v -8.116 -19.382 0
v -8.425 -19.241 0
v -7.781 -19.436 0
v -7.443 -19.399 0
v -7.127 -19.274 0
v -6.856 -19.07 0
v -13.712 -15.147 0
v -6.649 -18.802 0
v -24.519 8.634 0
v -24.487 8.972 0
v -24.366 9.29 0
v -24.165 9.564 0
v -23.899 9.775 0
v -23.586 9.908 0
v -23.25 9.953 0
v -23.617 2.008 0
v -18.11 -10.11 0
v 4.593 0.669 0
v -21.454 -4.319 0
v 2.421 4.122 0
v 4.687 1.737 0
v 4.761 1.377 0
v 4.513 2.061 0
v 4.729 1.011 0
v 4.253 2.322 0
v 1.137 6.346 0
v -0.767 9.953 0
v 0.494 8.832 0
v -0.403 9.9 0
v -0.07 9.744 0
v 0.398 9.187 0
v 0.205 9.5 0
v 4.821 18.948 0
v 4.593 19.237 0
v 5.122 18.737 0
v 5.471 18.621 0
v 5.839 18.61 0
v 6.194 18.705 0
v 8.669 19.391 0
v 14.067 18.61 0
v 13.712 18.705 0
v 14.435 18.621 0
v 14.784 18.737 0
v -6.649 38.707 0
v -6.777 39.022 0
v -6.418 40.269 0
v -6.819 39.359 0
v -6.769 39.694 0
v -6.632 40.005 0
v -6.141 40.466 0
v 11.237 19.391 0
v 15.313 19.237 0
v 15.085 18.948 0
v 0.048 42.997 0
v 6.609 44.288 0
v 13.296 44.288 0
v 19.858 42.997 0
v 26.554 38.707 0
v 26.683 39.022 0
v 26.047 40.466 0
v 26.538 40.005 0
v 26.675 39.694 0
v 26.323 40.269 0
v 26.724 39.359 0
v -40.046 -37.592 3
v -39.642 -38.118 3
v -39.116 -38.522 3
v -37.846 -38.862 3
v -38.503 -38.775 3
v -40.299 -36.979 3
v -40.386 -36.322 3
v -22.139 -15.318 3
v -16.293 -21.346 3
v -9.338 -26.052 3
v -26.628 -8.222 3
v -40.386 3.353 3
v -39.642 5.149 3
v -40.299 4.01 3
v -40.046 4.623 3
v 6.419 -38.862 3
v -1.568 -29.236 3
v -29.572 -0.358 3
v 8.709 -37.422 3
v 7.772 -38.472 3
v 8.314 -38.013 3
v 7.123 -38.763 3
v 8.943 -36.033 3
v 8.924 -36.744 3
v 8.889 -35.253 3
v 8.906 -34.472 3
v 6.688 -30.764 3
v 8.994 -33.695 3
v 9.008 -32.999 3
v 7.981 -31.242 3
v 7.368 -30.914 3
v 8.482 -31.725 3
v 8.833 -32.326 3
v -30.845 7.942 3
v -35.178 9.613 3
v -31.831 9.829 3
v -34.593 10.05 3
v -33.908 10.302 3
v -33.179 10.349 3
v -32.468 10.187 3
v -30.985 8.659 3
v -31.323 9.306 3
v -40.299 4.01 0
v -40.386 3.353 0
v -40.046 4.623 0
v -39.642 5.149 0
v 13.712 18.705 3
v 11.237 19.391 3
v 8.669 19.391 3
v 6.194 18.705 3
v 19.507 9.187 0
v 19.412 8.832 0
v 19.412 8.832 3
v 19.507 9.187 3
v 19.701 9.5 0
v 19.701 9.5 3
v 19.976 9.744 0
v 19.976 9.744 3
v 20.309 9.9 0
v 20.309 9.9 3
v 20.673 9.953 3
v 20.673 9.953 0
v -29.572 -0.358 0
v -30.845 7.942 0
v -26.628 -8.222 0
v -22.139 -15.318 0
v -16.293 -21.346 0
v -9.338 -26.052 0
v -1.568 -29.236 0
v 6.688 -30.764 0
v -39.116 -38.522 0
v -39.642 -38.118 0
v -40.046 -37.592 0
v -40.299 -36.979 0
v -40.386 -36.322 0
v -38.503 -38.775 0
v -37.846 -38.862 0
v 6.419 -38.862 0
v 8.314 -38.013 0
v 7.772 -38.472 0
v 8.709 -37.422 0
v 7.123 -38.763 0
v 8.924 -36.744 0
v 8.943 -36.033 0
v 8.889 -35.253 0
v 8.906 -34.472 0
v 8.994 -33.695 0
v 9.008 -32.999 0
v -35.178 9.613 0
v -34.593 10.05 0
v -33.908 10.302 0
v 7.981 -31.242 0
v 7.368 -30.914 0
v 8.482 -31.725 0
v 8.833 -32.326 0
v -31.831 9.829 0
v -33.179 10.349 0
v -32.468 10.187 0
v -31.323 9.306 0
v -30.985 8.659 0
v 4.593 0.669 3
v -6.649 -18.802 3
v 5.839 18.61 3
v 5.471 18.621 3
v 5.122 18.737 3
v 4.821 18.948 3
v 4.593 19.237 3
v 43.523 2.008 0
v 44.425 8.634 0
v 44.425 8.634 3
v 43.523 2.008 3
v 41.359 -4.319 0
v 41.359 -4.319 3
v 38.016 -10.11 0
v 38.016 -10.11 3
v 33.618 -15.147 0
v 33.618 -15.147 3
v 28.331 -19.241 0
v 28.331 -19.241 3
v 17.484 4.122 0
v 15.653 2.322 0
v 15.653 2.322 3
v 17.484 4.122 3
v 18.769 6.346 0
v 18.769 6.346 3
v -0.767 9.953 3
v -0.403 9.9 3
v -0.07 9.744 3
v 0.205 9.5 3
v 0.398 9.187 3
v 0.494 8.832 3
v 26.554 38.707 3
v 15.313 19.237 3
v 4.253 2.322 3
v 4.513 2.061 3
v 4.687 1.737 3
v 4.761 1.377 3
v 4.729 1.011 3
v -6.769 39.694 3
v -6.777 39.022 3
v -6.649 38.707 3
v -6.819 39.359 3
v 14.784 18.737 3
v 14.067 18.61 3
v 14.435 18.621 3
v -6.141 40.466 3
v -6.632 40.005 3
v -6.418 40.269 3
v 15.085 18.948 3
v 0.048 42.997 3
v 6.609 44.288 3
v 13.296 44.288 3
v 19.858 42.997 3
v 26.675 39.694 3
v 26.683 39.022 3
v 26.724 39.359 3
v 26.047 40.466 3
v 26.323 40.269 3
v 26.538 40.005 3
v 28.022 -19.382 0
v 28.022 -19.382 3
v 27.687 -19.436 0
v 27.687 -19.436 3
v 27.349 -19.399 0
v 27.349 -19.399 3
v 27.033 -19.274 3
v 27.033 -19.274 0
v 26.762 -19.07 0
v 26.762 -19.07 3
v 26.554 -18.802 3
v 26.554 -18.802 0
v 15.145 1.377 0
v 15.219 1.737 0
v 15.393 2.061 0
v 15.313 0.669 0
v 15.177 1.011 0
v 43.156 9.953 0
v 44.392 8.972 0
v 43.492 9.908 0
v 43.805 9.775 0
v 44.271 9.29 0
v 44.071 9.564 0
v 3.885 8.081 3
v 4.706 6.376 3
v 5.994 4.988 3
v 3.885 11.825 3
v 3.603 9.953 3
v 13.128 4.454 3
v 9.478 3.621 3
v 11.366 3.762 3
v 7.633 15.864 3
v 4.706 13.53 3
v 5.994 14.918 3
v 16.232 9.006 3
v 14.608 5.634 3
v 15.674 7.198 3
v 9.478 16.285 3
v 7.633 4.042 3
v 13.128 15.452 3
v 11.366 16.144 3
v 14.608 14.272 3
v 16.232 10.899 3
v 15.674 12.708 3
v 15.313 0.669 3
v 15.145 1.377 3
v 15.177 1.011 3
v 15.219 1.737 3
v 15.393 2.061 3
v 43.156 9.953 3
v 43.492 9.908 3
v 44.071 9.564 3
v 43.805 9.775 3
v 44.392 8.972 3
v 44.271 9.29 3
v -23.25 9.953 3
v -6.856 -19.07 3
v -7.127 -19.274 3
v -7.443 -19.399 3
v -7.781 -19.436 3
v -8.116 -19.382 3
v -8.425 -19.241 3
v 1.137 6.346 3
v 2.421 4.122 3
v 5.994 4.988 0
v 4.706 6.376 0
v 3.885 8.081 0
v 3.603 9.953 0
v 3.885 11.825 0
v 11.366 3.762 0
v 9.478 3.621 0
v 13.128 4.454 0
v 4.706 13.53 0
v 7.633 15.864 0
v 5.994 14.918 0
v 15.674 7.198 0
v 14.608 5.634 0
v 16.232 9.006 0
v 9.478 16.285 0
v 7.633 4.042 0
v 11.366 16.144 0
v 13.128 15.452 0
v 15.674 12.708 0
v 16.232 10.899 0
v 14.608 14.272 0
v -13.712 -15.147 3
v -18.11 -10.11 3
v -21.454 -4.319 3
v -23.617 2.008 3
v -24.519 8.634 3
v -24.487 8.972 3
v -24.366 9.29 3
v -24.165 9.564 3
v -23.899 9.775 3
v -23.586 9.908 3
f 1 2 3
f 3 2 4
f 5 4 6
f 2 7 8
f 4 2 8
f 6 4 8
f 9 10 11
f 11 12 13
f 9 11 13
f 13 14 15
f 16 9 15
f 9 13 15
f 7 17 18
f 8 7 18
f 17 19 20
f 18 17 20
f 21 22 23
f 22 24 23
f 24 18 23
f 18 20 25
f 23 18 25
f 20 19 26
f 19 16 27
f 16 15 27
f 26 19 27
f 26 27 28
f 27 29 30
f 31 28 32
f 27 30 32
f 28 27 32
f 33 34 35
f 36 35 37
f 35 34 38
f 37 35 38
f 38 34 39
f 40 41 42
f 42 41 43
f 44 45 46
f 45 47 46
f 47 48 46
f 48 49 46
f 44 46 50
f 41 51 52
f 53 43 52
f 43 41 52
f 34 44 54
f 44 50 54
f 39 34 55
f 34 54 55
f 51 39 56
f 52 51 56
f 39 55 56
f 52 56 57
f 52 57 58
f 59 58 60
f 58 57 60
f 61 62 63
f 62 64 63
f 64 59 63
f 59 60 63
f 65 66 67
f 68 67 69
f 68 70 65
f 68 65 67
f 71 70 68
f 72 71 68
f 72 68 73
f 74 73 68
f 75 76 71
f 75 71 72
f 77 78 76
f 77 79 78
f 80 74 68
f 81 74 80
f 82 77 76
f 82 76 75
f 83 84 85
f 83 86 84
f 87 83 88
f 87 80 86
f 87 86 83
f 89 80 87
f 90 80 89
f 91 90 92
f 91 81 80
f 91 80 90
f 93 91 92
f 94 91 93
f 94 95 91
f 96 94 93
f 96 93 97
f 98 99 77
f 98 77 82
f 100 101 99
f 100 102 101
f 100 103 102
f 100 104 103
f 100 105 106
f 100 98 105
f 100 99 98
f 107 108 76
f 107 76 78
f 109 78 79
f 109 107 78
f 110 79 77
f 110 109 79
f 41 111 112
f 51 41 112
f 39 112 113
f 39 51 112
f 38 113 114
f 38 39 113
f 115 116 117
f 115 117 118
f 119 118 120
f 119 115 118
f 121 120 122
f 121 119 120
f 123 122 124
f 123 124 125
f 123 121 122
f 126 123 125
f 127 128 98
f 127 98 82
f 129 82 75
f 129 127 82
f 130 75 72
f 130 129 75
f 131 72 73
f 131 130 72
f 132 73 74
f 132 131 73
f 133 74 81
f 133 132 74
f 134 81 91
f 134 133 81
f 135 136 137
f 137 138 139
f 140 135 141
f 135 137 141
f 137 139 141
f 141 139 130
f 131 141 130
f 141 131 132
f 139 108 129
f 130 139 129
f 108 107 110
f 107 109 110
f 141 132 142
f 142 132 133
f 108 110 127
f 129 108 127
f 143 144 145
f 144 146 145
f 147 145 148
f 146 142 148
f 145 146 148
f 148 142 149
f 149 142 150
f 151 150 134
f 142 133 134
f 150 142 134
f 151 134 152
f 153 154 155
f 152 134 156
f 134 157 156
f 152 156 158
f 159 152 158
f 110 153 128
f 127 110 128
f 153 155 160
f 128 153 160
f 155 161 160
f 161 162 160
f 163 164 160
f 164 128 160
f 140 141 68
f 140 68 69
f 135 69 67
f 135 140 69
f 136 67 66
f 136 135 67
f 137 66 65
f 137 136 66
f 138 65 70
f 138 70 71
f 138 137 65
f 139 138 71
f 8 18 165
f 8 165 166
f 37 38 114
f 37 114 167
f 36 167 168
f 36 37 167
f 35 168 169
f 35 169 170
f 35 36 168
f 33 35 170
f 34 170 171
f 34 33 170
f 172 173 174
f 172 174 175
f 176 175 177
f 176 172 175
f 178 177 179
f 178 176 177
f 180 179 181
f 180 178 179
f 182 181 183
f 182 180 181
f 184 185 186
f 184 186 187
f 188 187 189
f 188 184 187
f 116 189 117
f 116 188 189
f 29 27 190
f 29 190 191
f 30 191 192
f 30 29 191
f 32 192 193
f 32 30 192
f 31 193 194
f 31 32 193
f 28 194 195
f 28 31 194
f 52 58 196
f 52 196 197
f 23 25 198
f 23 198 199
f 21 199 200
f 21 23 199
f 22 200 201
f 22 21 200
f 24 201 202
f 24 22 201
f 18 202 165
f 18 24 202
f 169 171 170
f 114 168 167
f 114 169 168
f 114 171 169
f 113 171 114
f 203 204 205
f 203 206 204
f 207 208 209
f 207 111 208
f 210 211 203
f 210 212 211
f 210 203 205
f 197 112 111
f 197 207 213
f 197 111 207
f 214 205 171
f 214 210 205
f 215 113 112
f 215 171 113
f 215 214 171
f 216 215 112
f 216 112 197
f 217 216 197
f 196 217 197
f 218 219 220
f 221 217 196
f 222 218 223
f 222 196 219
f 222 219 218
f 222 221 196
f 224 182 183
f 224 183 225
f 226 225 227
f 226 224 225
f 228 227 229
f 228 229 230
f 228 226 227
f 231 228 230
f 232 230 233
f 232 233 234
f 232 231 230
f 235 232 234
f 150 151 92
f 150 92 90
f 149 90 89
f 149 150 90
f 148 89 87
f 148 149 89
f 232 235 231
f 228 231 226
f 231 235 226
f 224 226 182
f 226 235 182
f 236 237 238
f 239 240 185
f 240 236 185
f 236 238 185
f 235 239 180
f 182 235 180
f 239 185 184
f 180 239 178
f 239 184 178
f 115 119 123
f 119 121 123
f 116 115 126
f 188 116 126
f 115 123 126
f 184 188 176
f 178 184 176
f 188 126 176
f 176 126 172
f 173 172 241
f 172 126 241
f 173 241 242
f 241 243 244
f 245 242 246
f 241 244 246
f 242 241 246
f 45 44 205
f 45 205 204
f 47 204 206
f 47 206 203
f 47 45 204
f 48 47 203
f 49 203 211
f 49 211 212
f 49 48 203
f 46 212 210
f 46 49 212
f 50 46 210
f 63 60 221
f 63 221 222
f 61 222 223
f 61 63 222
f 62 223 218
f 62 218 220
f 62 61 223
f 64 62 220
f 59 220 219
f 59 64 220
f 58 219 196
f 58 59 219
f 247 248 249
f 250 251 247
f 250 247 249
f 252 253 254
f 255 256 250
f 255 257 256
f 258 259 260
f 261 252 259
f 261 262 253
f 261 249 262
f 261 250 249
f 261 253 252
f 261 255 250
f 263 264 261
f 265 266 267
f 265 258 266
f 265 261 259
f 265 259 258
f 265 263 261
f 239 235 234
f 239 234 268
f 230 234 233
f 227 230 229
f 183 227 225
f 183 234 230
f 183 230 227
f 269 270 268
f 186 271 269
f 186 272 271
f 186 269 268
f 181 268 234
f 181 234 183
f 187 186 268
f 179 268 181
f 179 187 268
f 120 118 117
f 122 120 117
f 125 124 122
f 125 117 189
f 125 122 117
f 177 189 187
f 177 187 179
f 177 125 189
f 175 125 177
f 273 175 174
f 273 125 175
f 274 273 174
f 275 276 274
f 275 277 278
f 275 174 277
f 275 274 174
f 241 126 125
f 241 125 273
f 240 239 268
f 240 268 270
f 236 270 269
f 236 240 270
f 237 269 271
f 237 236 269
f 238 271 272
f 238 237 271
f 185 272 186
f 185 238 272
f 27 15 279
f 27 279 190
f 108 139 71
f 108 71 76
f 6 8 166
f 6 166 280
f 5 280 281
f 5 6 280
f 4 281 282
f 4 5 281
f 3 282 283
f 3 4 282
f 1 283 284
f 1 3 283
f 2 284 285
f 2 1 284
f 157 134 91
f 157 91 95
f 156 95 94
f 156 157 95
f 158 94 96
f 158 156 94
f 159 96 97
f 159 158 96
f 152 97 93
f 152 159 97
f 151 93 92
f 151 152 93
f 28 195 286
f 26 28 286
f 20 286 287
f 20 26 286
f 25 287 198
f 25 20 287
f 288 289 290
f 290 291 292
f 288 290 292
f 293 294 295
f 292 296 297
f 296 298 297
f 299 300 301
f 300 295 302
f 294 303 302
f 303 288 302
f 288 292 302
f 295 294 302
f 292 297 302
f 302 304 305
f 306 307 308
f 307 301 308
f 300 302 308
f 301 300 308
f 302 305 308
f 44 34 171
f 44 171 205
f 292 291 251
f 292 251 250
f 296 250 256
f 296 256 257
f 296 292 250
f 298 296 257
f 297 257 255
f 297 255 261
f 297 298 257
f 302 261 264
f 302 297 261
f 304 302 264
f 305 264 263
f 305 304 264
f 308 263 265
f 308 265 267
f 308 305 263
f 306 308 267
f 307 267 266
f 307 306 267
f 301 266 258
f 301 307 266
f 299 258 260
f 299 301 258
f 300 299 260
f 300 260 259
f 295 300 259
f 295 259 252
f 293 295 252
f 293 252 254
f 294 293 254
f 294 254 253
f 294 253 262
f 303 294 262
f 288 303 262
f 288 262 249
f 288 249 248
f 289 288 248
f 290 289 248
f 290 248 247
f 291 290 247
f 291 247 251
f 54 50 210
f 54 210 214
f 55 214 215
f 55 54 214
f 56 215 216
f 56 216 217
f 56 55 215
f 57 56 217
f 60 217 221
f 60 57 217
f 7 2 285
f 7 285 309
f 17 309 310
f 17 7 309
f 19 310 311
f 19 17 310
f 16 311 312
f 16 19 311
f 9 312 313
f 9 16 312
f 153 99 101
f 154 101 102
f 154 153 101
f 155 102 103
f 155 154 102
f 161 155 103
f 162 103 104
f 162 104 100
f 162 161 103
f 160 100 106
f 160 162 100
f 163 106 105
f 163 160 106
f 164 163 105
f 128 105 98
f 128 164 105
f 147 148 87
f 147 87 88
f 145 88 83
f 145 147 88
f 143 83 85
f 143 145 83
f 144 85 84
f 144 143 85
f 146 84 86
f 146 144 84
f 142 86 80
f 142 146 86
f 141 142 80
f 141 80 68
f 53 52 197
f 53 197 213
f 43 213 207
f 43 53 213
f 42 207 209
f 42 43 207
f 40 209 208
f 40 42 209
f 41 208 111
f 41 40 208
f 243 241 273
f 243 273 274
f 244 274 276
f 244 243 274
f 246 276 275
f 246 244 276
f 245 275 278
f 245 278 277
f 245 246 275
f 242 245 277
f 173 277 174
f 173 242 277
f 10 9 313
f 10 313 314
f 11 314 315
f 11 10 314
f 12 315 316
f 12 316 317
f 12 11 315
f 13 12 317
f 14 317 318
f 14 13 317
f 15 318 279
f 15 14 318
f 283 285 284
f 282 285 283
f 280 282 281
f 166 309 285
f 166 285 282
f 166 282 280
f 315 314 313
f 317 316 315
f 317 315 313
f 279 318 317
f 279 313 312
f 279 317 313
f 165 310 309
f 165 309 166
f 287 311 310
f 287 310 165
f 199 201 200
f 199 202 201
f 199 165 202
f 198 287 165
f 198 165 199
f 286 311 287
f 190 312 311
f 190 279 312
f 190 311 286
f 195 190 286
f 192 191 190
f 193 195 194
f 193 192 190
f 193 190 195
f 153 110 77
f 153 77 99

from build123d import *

# Parameters (mm, degrees)
SKETCH1_W           = 101.6
SKETCH1_H           = 101.6
BOSS_EXTRUDE1_DEPTH = 3
SKETCH3_W           = 101.6
SKETCH3_H           = 101.6
SKETCH3_R           = 6.35
CUT_EXTRUDE1_DEPTH  = 72.904659098


with BuildPart() as part:
    # Sketch1 → Boss-Extrude1 (new body)
    with BuildSketch(Plane.XY):
        Rectangle(SKETCH1_W, SKETCH1_H)
    extrude(amount=BOSS_EXTRUDE1_DEPTH)

    # Sketch3 → Cut-Extrude1 (cut, through all)
    with BuildSketch(Plane(origin=(0, 0, 0), x_dir=(-1, 0, 0), z_dir=(0, 0, -1))):
        Rectangle(SKETCH3_W, SKETCH3_H)
        with Locations((-9.952896715, 9.952896715)):
            Circle(SKETCH3_R, mode=Mode.SUBTRACT)
        with BuildLine():
            ThreePointArc((37.846, -38.862), (39.642051224, -38.118051224), (40.386, -36.322))
            Line((40.386, -36.322), (40.386, 3.353015566))
            ThreePointArc((40.386, 3.353015566), (40.192654013, 4.325031484), (39.642051224, 5.14906679))
            Line((39.642051224, 5.14906679), (35.177671526, 9.613446489))
            ThreePointArc((35.177671526, 9.613446489), (32.467667298, 10.18726655), (30.844698846, 7.942413376))
            ThreePointArc((30.844698846, 7.942413376), (19.371216203, -18.482683961), (-6.688461818, -30.76355342))
            ThreePointArc((-6.688461818, -30.76355342), (-8.481874265, -31.725089418), (-8.993918742, -33.694528459))
            ThreePointArc((-8.993918742, -33.694528459), (-8.888689559, -34.862242487), (-8.942533745, -36.033451281))
            ThreePointArc((-8.942533745, -36.033451281), (-8.314301808, -38.012959233), (-6.418976803, -38.862))
            Line((-6.418976803, -38.862), (37.846, -38.862))
        make_face(mode=Mode.SUBTRACT)
        with BuildLine():
            ThreePointArc((6.141160454, 40.465704827), (-9.952896715, 44.45), (-26.046953884, 40.465704827))
            ThreePointArc((-26.046953884, 40.465704827), (-26.67467501, 39.694473658), (-26.554308498, 38.7073854))
            Line((-26.554308498, 38.7073854), (-15.312913623, 19.236718328))
            ThreePointArc((-15.312913623, 19.236718328), (-14.613476332, 18.6664931), (-13.711865519, 18.704798139))
            ThreePointArc((-13.711865519, 18.704798139), (-9.952896715, 19.477896715), (-6.193927911, 18.704798139))
            ThreePointArc((-6.193927911, 18.704798139), (-5.292317098, 18.6664931), (-4.592879807, 19.236718328))
            Line((-4.592879807, 19.236718328), (6.648515068, 38.7073854))
            ThreePointArc((6.648515068, 38.7073854), (6.76888158, 39.694473658), (6.141160454, 40.465704827))
        make_face(mode=Mode.SUBTRACT)
        with BuildLine():
            ThreePointArc((-28.330735096, -19.2413697), (-27.348968749, -19.399376556), (-26.554308498, -18.80159197))
            Line((-26.554308498, -18.80159197), (-15.312913623, 0.669075101))
            ThreePointArc((-15.312913623, 0.669075101), (-15.168802735, 1.559918177), (-15.652781277, 2.321583527))
            ThreePointArc((-15.652781277, 2.321583527), (-18.201788686, 5.190396715), (-19.411750081, 8.83230848))
            ThreePointArc((-19.411750081, 8.83230848), (-19.829382352, 9.632278867), (-20.67293053, 9.952896715))
            Line((-20.67293053, 9.952896715), (-43.15572028, 9.952896715))
            ThreePointArc((-43.15572028, 9.952896715), (-44.070747044, 9.563593043), (-44.424792266, 8.634355017))
            ThreePointArc((-44.424792266, 8.634355017), (-39.828264517, -7.295654928), (-28.330735096, -19.2413697))
        make_face(mode=Mode.SUBTRACT)
        with BuildLine():
            ThreePointArc((-4.253012153, 2.321583527), (-4.736990695, 1.559918177), (-4.592879807, 0.669075101))
            Line((-4.592879807, 0.669075101), (6.648515068, -18.80159197))
            ThreePointArc((6.648515068, -18.80159197), (7.443175319, -19.399376556), (8.424941666, -19.2413697))
            ThreePointArc((8.424941666, -19.2413697), (19.922471087, -7.295654928), (24.518998836, 8.634355017))
            ThreePointArc((24.518998836, 8.634355017), (24.164953614, 9.563593043), (23.249926851, 9.952896715))
            Line((23.249926851, 9.952896715), (0.7671371, 9.952896715))
            ThreePointArc((0.7671371, 9.952896715), (-0.076411078, 9.632278867), (-0.494043349, 8.83230848))
            ThreePointArc((-0.494043349, 8.83230848), (-1.704004744, 5.190396715), (-4.253012153, 2.321583527))
        make_face(mode=Mode.SUBTRACT)
    extrude(amount=-CUT_EXTRUDE1_DEPTH, mode=Mode.SUBTRACT)


with BuildPart() as cut_extrude1_piece_1:
    # of the separate pieces the step leaves, piece 1, a body of its own (cut_extrude1_pieces)
    add(part.part.solids().sort_by_distance((6.688461818, -30.76355342, 0))[0])


with BuildPart() as cut_extrude1_piece_2:
    # of the separate pieces the step leaves, piece 2, a body of its own (cut_extrude1_pieces)
    add(part.part.solids().sort_by_distance((-0.7671371, 9.952896715, 0))[0])


with BuildPart() as cut_extrude1_piece_3:
    # of the separate pieces the step leaves, piece 3, a body of its own (cut_extrude1_pieces)
    add(part.part.solids().sort_by_distance((20.67293053, 9.952896715, 0))[0])


with BuildPart() as cut_extrude1_piece_4:
    # of the separate pieces the step leaves, piece 4, a body of its own (cut_extrude1_pieces)
    add(part.part.solids().sort_by_distance((4.592879807, 19.236718328, 0))[0])


with BuildPart() as cut_extrude1_piece_5:
    # of the separate pieces the step leaves, piece 5, a body of its own (cut_extrude1_pieces)
    add(part.part.solids().sort_by_distance((3.602896715, 9.952896715, 0))[0])


solid = Compound([cut_extrude1_piece_1.part, cut_extrude1_piece_2.part, cut_extrude1_piece_3.part, cut_extrude1_piece_4.part, cut_extrude1_piece_5.part])
